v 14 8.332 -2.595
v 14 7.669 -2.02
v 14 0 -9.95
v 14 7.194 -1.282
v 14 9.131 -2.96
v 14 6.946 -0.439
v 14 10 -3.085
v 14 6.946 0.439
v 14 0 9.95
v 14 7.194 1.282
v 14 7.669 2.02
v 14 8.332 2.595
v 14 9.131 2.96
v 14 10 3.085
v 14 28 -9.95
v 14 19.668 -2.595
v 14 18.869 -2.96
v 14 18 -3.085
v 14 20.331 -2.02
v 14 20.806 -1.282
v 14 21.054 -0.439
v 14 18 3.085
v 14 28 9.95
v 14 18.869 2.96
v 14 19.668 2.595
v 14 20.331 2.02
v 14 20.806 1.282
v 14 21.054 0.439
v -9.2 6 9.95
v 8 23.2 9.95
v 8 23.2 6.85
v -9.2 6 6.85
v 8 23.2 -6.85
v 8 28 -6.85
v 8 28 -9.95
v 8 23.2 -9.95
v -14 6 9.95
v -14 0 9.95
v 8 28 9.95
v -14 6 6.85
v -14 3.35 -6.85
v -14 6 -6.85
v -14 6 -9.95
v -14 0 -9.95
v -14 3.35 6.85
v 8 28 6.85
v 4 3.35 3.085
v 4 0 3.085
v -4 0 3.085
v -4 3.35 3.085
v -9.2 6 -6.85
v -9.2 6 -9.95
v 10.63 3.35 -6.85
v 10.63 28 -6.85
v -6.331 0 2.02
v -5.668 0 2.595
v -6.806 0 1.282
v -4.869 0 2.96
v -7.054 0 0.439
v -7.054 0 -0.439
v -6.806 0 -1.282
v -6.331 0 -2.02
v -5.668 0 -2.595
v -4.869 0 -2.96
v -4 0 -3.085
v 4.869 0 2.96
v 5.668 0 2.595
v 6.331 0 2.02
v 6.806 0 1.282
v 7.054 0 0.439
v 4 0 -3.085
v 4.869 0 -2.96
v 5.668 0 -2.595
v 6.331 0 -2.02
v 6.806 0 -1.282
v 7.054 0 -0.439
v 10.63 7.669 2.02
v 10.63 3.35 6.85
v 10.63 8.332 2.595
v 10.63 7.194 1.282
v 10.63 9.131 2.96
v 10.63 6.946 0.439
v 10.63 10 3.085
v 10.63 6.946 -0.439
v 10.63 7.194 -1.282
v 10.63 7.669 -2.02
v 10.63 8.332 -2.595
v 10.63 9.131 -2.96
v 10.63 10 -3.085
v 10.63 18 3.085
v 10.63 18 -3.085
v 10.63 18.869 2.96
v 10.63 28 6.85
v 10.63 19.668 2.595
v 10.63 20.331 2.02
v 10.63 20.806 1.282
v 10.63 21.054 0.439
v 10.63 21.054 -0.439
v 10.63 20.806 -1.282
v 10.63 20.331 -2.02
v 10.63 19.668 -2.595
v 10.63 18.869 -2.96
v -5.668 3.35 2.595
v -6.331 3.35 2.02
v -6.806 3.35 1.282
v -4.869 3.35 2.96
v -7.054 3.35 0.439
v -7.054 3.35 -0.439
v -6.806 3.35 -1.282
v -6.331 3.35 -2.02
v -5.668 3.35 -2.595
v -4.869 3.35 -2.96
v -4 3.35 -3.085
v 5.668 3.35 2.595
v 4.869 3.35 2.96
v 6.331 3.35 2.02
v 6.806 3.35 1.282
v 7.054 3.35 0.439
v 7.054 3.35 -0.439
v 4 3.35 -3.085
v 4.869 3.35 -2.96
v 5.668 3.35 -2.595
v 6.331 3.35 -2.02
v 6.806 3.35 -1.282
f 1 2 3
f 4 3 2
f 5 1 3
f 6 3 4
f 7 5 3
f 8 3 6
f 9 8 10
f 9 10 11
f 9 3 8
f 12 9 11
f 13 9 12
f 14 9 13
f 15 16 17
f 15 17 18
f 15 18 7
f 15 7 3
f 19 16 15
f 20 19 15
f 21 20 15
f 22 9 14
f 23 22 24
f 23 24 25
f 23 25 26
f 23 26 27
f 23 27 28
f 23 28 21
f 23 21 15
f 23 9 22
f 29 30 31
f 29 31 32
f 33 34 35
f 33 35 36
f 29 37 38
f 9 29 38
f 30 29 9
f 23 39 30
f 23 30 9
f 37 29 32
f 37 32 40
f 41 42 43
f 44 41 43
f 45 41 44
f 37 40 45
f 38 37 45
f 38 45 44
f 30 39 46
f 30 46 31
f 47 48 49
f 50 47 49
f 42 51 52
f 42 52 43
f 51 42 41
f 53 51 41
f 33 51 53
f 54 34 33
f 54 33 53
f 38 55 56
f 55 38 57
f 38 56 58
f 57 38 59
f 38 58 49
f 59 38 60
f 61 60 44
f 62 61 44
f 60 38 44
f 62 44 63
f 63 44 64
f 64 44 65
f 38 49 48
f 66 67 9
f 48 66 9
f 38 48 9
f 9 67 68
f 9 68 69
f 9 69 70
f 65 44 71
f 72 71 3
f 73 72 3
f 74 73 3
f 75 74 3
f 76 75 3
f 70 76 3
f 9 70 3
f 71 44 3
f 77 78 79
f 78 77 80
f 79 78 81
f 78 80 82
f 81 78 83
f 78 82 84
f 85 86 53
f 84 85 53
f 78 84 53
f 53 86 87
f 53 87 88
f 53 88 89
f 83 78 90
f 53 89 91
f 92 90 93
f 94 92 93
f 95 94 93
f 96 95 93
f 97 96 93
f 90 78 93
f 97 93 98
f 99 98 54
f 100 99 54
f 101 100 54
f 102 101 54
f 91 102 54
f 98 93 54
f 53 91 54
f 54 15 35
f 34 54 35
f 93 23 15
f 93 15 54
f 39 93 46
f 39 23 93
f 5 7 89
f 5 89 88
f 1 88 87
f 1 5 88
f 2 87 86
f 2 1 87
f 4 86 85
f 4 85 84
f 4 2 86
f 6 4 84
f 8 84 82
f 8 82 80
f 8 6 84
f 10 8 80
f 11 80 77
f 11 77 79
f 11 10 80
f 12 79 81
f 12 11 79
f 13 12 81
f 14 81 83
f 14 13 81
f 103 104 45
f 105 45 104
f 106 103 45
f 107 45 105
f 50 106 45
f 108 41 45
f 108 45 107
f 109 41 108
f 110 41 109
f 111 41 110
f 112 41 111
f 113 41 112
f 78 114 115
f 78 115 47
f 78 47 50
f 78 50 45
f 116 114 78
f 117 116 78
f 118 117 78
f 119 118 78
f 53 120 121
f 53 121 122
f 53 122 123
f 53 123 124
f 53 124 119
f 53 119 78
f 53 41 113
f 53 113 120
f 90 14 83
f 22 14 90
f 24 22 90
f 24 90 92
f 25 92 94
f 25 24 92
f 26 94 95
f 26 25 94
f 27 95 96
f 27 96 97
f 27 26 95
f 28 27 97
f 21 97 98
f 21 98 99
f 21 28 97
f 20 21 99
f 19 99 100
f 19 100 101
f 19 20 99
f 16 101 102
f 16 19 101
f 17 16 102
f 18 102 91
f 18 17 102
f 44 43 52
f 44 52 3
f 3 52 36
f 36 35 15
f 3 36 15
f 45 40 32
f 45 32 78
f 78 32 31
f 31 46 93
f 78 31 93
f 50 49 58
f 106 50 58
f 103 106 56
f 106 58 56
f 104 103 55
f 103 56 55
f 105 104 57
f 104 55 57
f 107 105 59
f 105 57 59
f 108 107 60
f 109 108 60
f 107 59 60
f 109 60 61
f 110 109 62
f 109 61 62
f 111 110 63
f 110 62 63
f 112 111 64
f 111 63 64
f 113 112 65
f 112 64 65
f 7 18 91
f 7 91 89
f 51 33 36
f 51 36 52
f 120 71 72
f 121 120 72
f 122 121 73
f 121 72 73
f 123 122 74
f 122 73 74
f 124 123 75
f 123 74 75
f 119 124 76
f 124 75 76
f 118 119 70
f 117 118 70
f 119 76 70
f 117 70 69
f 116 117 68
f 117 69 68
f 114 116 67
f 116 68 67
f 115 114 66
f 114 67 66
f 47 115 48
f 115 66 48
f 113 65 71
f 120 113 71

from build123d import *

# Parameters (mm, degrees)
SKETCH_1_W      = 28
SKETCH_1_H      = 19.9
EXTRUDE_1_DEPTH = 3.35
EXTRUDE_2_DEPTH = 3.1
EXTRUDE_START   = -16.8
EXTRUDE_3_DEPTH = 3.1
SKETCH_4_W      = 19.9
SKETCH_4_H      = 28
EXTRUDE_4_DEPTH = 3.37


with BuildPart() as part:
    # 草图1 → 凸台-拉伸1 (new body)
    with BuildSketch(Plane(origin=(0, 0, 0), x_dir=(1, 0, 0), z_dir=(0, 1, 0))):
        Rectangle(SKETCH_1_W, SKETCH_1_H)
        with BuildLine():
            Line((-4, 3.085), (4, 3.085))
            ThreePointArc((4, 3.085), (7.085, 0), (4, -3.085))
            Line((4, -3.085), (-4, -3.085))
            ThreePointArc((-4, -3.085), (-7.085, 0), (-4, 3.085))
        make_face(mode=Mode.SUBTRACT)
    extrude(amount=EXTRUDE_1_DEPTH)

    # 草图3 → 凸台-拉伸2 (add)
    with BuildSketch(Plane.XY.offset(9.95)):
        Polygon((14, 0), (14, 28), (8, 28), (8, 23.2), (-9.2, 6), (-14, 6), (-14, 0), align=None)
    extrude(amount=-EXTRUDE_2_DEPTH)

    # 草图3<3> → 凸台-拉伸3 (add)
    with BuildSketch(Plane.XY.offset(9.95).offset(EXTRUDE_START)):
        Polygon((14, 0), (14, 28), (8, 28), (8, 23.2), (-9.2, 6), (-14, 6), (-14, 0), align=None)
    extrude(amount=-EXTRUDE_3_DEPTH)

    # 草图4 → 凸台-拉伸4 (add)
    with BuildSketch(Plane(origin=(14, 0, 0), x_dir=(0, 0, -1), z_dir=(1, 0, 0))):
        with Locations((0, 14)):
            Rectangle(SKETCH_4_W, SKETCH_4_H)
        with BuildLine():
            Line((3.085, 18), (3.085, 10))
            ThreePointArc((3.085, 10), (0, 6.915), (-3.085, 10))
            Line((-3.085, 10), (-3.085, 18))
            ThreePointArc((-3.085, 18), (0, 21.085), (3.085, 18))
        make_face(mode=Mode.SUBTRACT)
    extrude(amount=-EXTRUDE_4_DEPTH)


solid = part.part
